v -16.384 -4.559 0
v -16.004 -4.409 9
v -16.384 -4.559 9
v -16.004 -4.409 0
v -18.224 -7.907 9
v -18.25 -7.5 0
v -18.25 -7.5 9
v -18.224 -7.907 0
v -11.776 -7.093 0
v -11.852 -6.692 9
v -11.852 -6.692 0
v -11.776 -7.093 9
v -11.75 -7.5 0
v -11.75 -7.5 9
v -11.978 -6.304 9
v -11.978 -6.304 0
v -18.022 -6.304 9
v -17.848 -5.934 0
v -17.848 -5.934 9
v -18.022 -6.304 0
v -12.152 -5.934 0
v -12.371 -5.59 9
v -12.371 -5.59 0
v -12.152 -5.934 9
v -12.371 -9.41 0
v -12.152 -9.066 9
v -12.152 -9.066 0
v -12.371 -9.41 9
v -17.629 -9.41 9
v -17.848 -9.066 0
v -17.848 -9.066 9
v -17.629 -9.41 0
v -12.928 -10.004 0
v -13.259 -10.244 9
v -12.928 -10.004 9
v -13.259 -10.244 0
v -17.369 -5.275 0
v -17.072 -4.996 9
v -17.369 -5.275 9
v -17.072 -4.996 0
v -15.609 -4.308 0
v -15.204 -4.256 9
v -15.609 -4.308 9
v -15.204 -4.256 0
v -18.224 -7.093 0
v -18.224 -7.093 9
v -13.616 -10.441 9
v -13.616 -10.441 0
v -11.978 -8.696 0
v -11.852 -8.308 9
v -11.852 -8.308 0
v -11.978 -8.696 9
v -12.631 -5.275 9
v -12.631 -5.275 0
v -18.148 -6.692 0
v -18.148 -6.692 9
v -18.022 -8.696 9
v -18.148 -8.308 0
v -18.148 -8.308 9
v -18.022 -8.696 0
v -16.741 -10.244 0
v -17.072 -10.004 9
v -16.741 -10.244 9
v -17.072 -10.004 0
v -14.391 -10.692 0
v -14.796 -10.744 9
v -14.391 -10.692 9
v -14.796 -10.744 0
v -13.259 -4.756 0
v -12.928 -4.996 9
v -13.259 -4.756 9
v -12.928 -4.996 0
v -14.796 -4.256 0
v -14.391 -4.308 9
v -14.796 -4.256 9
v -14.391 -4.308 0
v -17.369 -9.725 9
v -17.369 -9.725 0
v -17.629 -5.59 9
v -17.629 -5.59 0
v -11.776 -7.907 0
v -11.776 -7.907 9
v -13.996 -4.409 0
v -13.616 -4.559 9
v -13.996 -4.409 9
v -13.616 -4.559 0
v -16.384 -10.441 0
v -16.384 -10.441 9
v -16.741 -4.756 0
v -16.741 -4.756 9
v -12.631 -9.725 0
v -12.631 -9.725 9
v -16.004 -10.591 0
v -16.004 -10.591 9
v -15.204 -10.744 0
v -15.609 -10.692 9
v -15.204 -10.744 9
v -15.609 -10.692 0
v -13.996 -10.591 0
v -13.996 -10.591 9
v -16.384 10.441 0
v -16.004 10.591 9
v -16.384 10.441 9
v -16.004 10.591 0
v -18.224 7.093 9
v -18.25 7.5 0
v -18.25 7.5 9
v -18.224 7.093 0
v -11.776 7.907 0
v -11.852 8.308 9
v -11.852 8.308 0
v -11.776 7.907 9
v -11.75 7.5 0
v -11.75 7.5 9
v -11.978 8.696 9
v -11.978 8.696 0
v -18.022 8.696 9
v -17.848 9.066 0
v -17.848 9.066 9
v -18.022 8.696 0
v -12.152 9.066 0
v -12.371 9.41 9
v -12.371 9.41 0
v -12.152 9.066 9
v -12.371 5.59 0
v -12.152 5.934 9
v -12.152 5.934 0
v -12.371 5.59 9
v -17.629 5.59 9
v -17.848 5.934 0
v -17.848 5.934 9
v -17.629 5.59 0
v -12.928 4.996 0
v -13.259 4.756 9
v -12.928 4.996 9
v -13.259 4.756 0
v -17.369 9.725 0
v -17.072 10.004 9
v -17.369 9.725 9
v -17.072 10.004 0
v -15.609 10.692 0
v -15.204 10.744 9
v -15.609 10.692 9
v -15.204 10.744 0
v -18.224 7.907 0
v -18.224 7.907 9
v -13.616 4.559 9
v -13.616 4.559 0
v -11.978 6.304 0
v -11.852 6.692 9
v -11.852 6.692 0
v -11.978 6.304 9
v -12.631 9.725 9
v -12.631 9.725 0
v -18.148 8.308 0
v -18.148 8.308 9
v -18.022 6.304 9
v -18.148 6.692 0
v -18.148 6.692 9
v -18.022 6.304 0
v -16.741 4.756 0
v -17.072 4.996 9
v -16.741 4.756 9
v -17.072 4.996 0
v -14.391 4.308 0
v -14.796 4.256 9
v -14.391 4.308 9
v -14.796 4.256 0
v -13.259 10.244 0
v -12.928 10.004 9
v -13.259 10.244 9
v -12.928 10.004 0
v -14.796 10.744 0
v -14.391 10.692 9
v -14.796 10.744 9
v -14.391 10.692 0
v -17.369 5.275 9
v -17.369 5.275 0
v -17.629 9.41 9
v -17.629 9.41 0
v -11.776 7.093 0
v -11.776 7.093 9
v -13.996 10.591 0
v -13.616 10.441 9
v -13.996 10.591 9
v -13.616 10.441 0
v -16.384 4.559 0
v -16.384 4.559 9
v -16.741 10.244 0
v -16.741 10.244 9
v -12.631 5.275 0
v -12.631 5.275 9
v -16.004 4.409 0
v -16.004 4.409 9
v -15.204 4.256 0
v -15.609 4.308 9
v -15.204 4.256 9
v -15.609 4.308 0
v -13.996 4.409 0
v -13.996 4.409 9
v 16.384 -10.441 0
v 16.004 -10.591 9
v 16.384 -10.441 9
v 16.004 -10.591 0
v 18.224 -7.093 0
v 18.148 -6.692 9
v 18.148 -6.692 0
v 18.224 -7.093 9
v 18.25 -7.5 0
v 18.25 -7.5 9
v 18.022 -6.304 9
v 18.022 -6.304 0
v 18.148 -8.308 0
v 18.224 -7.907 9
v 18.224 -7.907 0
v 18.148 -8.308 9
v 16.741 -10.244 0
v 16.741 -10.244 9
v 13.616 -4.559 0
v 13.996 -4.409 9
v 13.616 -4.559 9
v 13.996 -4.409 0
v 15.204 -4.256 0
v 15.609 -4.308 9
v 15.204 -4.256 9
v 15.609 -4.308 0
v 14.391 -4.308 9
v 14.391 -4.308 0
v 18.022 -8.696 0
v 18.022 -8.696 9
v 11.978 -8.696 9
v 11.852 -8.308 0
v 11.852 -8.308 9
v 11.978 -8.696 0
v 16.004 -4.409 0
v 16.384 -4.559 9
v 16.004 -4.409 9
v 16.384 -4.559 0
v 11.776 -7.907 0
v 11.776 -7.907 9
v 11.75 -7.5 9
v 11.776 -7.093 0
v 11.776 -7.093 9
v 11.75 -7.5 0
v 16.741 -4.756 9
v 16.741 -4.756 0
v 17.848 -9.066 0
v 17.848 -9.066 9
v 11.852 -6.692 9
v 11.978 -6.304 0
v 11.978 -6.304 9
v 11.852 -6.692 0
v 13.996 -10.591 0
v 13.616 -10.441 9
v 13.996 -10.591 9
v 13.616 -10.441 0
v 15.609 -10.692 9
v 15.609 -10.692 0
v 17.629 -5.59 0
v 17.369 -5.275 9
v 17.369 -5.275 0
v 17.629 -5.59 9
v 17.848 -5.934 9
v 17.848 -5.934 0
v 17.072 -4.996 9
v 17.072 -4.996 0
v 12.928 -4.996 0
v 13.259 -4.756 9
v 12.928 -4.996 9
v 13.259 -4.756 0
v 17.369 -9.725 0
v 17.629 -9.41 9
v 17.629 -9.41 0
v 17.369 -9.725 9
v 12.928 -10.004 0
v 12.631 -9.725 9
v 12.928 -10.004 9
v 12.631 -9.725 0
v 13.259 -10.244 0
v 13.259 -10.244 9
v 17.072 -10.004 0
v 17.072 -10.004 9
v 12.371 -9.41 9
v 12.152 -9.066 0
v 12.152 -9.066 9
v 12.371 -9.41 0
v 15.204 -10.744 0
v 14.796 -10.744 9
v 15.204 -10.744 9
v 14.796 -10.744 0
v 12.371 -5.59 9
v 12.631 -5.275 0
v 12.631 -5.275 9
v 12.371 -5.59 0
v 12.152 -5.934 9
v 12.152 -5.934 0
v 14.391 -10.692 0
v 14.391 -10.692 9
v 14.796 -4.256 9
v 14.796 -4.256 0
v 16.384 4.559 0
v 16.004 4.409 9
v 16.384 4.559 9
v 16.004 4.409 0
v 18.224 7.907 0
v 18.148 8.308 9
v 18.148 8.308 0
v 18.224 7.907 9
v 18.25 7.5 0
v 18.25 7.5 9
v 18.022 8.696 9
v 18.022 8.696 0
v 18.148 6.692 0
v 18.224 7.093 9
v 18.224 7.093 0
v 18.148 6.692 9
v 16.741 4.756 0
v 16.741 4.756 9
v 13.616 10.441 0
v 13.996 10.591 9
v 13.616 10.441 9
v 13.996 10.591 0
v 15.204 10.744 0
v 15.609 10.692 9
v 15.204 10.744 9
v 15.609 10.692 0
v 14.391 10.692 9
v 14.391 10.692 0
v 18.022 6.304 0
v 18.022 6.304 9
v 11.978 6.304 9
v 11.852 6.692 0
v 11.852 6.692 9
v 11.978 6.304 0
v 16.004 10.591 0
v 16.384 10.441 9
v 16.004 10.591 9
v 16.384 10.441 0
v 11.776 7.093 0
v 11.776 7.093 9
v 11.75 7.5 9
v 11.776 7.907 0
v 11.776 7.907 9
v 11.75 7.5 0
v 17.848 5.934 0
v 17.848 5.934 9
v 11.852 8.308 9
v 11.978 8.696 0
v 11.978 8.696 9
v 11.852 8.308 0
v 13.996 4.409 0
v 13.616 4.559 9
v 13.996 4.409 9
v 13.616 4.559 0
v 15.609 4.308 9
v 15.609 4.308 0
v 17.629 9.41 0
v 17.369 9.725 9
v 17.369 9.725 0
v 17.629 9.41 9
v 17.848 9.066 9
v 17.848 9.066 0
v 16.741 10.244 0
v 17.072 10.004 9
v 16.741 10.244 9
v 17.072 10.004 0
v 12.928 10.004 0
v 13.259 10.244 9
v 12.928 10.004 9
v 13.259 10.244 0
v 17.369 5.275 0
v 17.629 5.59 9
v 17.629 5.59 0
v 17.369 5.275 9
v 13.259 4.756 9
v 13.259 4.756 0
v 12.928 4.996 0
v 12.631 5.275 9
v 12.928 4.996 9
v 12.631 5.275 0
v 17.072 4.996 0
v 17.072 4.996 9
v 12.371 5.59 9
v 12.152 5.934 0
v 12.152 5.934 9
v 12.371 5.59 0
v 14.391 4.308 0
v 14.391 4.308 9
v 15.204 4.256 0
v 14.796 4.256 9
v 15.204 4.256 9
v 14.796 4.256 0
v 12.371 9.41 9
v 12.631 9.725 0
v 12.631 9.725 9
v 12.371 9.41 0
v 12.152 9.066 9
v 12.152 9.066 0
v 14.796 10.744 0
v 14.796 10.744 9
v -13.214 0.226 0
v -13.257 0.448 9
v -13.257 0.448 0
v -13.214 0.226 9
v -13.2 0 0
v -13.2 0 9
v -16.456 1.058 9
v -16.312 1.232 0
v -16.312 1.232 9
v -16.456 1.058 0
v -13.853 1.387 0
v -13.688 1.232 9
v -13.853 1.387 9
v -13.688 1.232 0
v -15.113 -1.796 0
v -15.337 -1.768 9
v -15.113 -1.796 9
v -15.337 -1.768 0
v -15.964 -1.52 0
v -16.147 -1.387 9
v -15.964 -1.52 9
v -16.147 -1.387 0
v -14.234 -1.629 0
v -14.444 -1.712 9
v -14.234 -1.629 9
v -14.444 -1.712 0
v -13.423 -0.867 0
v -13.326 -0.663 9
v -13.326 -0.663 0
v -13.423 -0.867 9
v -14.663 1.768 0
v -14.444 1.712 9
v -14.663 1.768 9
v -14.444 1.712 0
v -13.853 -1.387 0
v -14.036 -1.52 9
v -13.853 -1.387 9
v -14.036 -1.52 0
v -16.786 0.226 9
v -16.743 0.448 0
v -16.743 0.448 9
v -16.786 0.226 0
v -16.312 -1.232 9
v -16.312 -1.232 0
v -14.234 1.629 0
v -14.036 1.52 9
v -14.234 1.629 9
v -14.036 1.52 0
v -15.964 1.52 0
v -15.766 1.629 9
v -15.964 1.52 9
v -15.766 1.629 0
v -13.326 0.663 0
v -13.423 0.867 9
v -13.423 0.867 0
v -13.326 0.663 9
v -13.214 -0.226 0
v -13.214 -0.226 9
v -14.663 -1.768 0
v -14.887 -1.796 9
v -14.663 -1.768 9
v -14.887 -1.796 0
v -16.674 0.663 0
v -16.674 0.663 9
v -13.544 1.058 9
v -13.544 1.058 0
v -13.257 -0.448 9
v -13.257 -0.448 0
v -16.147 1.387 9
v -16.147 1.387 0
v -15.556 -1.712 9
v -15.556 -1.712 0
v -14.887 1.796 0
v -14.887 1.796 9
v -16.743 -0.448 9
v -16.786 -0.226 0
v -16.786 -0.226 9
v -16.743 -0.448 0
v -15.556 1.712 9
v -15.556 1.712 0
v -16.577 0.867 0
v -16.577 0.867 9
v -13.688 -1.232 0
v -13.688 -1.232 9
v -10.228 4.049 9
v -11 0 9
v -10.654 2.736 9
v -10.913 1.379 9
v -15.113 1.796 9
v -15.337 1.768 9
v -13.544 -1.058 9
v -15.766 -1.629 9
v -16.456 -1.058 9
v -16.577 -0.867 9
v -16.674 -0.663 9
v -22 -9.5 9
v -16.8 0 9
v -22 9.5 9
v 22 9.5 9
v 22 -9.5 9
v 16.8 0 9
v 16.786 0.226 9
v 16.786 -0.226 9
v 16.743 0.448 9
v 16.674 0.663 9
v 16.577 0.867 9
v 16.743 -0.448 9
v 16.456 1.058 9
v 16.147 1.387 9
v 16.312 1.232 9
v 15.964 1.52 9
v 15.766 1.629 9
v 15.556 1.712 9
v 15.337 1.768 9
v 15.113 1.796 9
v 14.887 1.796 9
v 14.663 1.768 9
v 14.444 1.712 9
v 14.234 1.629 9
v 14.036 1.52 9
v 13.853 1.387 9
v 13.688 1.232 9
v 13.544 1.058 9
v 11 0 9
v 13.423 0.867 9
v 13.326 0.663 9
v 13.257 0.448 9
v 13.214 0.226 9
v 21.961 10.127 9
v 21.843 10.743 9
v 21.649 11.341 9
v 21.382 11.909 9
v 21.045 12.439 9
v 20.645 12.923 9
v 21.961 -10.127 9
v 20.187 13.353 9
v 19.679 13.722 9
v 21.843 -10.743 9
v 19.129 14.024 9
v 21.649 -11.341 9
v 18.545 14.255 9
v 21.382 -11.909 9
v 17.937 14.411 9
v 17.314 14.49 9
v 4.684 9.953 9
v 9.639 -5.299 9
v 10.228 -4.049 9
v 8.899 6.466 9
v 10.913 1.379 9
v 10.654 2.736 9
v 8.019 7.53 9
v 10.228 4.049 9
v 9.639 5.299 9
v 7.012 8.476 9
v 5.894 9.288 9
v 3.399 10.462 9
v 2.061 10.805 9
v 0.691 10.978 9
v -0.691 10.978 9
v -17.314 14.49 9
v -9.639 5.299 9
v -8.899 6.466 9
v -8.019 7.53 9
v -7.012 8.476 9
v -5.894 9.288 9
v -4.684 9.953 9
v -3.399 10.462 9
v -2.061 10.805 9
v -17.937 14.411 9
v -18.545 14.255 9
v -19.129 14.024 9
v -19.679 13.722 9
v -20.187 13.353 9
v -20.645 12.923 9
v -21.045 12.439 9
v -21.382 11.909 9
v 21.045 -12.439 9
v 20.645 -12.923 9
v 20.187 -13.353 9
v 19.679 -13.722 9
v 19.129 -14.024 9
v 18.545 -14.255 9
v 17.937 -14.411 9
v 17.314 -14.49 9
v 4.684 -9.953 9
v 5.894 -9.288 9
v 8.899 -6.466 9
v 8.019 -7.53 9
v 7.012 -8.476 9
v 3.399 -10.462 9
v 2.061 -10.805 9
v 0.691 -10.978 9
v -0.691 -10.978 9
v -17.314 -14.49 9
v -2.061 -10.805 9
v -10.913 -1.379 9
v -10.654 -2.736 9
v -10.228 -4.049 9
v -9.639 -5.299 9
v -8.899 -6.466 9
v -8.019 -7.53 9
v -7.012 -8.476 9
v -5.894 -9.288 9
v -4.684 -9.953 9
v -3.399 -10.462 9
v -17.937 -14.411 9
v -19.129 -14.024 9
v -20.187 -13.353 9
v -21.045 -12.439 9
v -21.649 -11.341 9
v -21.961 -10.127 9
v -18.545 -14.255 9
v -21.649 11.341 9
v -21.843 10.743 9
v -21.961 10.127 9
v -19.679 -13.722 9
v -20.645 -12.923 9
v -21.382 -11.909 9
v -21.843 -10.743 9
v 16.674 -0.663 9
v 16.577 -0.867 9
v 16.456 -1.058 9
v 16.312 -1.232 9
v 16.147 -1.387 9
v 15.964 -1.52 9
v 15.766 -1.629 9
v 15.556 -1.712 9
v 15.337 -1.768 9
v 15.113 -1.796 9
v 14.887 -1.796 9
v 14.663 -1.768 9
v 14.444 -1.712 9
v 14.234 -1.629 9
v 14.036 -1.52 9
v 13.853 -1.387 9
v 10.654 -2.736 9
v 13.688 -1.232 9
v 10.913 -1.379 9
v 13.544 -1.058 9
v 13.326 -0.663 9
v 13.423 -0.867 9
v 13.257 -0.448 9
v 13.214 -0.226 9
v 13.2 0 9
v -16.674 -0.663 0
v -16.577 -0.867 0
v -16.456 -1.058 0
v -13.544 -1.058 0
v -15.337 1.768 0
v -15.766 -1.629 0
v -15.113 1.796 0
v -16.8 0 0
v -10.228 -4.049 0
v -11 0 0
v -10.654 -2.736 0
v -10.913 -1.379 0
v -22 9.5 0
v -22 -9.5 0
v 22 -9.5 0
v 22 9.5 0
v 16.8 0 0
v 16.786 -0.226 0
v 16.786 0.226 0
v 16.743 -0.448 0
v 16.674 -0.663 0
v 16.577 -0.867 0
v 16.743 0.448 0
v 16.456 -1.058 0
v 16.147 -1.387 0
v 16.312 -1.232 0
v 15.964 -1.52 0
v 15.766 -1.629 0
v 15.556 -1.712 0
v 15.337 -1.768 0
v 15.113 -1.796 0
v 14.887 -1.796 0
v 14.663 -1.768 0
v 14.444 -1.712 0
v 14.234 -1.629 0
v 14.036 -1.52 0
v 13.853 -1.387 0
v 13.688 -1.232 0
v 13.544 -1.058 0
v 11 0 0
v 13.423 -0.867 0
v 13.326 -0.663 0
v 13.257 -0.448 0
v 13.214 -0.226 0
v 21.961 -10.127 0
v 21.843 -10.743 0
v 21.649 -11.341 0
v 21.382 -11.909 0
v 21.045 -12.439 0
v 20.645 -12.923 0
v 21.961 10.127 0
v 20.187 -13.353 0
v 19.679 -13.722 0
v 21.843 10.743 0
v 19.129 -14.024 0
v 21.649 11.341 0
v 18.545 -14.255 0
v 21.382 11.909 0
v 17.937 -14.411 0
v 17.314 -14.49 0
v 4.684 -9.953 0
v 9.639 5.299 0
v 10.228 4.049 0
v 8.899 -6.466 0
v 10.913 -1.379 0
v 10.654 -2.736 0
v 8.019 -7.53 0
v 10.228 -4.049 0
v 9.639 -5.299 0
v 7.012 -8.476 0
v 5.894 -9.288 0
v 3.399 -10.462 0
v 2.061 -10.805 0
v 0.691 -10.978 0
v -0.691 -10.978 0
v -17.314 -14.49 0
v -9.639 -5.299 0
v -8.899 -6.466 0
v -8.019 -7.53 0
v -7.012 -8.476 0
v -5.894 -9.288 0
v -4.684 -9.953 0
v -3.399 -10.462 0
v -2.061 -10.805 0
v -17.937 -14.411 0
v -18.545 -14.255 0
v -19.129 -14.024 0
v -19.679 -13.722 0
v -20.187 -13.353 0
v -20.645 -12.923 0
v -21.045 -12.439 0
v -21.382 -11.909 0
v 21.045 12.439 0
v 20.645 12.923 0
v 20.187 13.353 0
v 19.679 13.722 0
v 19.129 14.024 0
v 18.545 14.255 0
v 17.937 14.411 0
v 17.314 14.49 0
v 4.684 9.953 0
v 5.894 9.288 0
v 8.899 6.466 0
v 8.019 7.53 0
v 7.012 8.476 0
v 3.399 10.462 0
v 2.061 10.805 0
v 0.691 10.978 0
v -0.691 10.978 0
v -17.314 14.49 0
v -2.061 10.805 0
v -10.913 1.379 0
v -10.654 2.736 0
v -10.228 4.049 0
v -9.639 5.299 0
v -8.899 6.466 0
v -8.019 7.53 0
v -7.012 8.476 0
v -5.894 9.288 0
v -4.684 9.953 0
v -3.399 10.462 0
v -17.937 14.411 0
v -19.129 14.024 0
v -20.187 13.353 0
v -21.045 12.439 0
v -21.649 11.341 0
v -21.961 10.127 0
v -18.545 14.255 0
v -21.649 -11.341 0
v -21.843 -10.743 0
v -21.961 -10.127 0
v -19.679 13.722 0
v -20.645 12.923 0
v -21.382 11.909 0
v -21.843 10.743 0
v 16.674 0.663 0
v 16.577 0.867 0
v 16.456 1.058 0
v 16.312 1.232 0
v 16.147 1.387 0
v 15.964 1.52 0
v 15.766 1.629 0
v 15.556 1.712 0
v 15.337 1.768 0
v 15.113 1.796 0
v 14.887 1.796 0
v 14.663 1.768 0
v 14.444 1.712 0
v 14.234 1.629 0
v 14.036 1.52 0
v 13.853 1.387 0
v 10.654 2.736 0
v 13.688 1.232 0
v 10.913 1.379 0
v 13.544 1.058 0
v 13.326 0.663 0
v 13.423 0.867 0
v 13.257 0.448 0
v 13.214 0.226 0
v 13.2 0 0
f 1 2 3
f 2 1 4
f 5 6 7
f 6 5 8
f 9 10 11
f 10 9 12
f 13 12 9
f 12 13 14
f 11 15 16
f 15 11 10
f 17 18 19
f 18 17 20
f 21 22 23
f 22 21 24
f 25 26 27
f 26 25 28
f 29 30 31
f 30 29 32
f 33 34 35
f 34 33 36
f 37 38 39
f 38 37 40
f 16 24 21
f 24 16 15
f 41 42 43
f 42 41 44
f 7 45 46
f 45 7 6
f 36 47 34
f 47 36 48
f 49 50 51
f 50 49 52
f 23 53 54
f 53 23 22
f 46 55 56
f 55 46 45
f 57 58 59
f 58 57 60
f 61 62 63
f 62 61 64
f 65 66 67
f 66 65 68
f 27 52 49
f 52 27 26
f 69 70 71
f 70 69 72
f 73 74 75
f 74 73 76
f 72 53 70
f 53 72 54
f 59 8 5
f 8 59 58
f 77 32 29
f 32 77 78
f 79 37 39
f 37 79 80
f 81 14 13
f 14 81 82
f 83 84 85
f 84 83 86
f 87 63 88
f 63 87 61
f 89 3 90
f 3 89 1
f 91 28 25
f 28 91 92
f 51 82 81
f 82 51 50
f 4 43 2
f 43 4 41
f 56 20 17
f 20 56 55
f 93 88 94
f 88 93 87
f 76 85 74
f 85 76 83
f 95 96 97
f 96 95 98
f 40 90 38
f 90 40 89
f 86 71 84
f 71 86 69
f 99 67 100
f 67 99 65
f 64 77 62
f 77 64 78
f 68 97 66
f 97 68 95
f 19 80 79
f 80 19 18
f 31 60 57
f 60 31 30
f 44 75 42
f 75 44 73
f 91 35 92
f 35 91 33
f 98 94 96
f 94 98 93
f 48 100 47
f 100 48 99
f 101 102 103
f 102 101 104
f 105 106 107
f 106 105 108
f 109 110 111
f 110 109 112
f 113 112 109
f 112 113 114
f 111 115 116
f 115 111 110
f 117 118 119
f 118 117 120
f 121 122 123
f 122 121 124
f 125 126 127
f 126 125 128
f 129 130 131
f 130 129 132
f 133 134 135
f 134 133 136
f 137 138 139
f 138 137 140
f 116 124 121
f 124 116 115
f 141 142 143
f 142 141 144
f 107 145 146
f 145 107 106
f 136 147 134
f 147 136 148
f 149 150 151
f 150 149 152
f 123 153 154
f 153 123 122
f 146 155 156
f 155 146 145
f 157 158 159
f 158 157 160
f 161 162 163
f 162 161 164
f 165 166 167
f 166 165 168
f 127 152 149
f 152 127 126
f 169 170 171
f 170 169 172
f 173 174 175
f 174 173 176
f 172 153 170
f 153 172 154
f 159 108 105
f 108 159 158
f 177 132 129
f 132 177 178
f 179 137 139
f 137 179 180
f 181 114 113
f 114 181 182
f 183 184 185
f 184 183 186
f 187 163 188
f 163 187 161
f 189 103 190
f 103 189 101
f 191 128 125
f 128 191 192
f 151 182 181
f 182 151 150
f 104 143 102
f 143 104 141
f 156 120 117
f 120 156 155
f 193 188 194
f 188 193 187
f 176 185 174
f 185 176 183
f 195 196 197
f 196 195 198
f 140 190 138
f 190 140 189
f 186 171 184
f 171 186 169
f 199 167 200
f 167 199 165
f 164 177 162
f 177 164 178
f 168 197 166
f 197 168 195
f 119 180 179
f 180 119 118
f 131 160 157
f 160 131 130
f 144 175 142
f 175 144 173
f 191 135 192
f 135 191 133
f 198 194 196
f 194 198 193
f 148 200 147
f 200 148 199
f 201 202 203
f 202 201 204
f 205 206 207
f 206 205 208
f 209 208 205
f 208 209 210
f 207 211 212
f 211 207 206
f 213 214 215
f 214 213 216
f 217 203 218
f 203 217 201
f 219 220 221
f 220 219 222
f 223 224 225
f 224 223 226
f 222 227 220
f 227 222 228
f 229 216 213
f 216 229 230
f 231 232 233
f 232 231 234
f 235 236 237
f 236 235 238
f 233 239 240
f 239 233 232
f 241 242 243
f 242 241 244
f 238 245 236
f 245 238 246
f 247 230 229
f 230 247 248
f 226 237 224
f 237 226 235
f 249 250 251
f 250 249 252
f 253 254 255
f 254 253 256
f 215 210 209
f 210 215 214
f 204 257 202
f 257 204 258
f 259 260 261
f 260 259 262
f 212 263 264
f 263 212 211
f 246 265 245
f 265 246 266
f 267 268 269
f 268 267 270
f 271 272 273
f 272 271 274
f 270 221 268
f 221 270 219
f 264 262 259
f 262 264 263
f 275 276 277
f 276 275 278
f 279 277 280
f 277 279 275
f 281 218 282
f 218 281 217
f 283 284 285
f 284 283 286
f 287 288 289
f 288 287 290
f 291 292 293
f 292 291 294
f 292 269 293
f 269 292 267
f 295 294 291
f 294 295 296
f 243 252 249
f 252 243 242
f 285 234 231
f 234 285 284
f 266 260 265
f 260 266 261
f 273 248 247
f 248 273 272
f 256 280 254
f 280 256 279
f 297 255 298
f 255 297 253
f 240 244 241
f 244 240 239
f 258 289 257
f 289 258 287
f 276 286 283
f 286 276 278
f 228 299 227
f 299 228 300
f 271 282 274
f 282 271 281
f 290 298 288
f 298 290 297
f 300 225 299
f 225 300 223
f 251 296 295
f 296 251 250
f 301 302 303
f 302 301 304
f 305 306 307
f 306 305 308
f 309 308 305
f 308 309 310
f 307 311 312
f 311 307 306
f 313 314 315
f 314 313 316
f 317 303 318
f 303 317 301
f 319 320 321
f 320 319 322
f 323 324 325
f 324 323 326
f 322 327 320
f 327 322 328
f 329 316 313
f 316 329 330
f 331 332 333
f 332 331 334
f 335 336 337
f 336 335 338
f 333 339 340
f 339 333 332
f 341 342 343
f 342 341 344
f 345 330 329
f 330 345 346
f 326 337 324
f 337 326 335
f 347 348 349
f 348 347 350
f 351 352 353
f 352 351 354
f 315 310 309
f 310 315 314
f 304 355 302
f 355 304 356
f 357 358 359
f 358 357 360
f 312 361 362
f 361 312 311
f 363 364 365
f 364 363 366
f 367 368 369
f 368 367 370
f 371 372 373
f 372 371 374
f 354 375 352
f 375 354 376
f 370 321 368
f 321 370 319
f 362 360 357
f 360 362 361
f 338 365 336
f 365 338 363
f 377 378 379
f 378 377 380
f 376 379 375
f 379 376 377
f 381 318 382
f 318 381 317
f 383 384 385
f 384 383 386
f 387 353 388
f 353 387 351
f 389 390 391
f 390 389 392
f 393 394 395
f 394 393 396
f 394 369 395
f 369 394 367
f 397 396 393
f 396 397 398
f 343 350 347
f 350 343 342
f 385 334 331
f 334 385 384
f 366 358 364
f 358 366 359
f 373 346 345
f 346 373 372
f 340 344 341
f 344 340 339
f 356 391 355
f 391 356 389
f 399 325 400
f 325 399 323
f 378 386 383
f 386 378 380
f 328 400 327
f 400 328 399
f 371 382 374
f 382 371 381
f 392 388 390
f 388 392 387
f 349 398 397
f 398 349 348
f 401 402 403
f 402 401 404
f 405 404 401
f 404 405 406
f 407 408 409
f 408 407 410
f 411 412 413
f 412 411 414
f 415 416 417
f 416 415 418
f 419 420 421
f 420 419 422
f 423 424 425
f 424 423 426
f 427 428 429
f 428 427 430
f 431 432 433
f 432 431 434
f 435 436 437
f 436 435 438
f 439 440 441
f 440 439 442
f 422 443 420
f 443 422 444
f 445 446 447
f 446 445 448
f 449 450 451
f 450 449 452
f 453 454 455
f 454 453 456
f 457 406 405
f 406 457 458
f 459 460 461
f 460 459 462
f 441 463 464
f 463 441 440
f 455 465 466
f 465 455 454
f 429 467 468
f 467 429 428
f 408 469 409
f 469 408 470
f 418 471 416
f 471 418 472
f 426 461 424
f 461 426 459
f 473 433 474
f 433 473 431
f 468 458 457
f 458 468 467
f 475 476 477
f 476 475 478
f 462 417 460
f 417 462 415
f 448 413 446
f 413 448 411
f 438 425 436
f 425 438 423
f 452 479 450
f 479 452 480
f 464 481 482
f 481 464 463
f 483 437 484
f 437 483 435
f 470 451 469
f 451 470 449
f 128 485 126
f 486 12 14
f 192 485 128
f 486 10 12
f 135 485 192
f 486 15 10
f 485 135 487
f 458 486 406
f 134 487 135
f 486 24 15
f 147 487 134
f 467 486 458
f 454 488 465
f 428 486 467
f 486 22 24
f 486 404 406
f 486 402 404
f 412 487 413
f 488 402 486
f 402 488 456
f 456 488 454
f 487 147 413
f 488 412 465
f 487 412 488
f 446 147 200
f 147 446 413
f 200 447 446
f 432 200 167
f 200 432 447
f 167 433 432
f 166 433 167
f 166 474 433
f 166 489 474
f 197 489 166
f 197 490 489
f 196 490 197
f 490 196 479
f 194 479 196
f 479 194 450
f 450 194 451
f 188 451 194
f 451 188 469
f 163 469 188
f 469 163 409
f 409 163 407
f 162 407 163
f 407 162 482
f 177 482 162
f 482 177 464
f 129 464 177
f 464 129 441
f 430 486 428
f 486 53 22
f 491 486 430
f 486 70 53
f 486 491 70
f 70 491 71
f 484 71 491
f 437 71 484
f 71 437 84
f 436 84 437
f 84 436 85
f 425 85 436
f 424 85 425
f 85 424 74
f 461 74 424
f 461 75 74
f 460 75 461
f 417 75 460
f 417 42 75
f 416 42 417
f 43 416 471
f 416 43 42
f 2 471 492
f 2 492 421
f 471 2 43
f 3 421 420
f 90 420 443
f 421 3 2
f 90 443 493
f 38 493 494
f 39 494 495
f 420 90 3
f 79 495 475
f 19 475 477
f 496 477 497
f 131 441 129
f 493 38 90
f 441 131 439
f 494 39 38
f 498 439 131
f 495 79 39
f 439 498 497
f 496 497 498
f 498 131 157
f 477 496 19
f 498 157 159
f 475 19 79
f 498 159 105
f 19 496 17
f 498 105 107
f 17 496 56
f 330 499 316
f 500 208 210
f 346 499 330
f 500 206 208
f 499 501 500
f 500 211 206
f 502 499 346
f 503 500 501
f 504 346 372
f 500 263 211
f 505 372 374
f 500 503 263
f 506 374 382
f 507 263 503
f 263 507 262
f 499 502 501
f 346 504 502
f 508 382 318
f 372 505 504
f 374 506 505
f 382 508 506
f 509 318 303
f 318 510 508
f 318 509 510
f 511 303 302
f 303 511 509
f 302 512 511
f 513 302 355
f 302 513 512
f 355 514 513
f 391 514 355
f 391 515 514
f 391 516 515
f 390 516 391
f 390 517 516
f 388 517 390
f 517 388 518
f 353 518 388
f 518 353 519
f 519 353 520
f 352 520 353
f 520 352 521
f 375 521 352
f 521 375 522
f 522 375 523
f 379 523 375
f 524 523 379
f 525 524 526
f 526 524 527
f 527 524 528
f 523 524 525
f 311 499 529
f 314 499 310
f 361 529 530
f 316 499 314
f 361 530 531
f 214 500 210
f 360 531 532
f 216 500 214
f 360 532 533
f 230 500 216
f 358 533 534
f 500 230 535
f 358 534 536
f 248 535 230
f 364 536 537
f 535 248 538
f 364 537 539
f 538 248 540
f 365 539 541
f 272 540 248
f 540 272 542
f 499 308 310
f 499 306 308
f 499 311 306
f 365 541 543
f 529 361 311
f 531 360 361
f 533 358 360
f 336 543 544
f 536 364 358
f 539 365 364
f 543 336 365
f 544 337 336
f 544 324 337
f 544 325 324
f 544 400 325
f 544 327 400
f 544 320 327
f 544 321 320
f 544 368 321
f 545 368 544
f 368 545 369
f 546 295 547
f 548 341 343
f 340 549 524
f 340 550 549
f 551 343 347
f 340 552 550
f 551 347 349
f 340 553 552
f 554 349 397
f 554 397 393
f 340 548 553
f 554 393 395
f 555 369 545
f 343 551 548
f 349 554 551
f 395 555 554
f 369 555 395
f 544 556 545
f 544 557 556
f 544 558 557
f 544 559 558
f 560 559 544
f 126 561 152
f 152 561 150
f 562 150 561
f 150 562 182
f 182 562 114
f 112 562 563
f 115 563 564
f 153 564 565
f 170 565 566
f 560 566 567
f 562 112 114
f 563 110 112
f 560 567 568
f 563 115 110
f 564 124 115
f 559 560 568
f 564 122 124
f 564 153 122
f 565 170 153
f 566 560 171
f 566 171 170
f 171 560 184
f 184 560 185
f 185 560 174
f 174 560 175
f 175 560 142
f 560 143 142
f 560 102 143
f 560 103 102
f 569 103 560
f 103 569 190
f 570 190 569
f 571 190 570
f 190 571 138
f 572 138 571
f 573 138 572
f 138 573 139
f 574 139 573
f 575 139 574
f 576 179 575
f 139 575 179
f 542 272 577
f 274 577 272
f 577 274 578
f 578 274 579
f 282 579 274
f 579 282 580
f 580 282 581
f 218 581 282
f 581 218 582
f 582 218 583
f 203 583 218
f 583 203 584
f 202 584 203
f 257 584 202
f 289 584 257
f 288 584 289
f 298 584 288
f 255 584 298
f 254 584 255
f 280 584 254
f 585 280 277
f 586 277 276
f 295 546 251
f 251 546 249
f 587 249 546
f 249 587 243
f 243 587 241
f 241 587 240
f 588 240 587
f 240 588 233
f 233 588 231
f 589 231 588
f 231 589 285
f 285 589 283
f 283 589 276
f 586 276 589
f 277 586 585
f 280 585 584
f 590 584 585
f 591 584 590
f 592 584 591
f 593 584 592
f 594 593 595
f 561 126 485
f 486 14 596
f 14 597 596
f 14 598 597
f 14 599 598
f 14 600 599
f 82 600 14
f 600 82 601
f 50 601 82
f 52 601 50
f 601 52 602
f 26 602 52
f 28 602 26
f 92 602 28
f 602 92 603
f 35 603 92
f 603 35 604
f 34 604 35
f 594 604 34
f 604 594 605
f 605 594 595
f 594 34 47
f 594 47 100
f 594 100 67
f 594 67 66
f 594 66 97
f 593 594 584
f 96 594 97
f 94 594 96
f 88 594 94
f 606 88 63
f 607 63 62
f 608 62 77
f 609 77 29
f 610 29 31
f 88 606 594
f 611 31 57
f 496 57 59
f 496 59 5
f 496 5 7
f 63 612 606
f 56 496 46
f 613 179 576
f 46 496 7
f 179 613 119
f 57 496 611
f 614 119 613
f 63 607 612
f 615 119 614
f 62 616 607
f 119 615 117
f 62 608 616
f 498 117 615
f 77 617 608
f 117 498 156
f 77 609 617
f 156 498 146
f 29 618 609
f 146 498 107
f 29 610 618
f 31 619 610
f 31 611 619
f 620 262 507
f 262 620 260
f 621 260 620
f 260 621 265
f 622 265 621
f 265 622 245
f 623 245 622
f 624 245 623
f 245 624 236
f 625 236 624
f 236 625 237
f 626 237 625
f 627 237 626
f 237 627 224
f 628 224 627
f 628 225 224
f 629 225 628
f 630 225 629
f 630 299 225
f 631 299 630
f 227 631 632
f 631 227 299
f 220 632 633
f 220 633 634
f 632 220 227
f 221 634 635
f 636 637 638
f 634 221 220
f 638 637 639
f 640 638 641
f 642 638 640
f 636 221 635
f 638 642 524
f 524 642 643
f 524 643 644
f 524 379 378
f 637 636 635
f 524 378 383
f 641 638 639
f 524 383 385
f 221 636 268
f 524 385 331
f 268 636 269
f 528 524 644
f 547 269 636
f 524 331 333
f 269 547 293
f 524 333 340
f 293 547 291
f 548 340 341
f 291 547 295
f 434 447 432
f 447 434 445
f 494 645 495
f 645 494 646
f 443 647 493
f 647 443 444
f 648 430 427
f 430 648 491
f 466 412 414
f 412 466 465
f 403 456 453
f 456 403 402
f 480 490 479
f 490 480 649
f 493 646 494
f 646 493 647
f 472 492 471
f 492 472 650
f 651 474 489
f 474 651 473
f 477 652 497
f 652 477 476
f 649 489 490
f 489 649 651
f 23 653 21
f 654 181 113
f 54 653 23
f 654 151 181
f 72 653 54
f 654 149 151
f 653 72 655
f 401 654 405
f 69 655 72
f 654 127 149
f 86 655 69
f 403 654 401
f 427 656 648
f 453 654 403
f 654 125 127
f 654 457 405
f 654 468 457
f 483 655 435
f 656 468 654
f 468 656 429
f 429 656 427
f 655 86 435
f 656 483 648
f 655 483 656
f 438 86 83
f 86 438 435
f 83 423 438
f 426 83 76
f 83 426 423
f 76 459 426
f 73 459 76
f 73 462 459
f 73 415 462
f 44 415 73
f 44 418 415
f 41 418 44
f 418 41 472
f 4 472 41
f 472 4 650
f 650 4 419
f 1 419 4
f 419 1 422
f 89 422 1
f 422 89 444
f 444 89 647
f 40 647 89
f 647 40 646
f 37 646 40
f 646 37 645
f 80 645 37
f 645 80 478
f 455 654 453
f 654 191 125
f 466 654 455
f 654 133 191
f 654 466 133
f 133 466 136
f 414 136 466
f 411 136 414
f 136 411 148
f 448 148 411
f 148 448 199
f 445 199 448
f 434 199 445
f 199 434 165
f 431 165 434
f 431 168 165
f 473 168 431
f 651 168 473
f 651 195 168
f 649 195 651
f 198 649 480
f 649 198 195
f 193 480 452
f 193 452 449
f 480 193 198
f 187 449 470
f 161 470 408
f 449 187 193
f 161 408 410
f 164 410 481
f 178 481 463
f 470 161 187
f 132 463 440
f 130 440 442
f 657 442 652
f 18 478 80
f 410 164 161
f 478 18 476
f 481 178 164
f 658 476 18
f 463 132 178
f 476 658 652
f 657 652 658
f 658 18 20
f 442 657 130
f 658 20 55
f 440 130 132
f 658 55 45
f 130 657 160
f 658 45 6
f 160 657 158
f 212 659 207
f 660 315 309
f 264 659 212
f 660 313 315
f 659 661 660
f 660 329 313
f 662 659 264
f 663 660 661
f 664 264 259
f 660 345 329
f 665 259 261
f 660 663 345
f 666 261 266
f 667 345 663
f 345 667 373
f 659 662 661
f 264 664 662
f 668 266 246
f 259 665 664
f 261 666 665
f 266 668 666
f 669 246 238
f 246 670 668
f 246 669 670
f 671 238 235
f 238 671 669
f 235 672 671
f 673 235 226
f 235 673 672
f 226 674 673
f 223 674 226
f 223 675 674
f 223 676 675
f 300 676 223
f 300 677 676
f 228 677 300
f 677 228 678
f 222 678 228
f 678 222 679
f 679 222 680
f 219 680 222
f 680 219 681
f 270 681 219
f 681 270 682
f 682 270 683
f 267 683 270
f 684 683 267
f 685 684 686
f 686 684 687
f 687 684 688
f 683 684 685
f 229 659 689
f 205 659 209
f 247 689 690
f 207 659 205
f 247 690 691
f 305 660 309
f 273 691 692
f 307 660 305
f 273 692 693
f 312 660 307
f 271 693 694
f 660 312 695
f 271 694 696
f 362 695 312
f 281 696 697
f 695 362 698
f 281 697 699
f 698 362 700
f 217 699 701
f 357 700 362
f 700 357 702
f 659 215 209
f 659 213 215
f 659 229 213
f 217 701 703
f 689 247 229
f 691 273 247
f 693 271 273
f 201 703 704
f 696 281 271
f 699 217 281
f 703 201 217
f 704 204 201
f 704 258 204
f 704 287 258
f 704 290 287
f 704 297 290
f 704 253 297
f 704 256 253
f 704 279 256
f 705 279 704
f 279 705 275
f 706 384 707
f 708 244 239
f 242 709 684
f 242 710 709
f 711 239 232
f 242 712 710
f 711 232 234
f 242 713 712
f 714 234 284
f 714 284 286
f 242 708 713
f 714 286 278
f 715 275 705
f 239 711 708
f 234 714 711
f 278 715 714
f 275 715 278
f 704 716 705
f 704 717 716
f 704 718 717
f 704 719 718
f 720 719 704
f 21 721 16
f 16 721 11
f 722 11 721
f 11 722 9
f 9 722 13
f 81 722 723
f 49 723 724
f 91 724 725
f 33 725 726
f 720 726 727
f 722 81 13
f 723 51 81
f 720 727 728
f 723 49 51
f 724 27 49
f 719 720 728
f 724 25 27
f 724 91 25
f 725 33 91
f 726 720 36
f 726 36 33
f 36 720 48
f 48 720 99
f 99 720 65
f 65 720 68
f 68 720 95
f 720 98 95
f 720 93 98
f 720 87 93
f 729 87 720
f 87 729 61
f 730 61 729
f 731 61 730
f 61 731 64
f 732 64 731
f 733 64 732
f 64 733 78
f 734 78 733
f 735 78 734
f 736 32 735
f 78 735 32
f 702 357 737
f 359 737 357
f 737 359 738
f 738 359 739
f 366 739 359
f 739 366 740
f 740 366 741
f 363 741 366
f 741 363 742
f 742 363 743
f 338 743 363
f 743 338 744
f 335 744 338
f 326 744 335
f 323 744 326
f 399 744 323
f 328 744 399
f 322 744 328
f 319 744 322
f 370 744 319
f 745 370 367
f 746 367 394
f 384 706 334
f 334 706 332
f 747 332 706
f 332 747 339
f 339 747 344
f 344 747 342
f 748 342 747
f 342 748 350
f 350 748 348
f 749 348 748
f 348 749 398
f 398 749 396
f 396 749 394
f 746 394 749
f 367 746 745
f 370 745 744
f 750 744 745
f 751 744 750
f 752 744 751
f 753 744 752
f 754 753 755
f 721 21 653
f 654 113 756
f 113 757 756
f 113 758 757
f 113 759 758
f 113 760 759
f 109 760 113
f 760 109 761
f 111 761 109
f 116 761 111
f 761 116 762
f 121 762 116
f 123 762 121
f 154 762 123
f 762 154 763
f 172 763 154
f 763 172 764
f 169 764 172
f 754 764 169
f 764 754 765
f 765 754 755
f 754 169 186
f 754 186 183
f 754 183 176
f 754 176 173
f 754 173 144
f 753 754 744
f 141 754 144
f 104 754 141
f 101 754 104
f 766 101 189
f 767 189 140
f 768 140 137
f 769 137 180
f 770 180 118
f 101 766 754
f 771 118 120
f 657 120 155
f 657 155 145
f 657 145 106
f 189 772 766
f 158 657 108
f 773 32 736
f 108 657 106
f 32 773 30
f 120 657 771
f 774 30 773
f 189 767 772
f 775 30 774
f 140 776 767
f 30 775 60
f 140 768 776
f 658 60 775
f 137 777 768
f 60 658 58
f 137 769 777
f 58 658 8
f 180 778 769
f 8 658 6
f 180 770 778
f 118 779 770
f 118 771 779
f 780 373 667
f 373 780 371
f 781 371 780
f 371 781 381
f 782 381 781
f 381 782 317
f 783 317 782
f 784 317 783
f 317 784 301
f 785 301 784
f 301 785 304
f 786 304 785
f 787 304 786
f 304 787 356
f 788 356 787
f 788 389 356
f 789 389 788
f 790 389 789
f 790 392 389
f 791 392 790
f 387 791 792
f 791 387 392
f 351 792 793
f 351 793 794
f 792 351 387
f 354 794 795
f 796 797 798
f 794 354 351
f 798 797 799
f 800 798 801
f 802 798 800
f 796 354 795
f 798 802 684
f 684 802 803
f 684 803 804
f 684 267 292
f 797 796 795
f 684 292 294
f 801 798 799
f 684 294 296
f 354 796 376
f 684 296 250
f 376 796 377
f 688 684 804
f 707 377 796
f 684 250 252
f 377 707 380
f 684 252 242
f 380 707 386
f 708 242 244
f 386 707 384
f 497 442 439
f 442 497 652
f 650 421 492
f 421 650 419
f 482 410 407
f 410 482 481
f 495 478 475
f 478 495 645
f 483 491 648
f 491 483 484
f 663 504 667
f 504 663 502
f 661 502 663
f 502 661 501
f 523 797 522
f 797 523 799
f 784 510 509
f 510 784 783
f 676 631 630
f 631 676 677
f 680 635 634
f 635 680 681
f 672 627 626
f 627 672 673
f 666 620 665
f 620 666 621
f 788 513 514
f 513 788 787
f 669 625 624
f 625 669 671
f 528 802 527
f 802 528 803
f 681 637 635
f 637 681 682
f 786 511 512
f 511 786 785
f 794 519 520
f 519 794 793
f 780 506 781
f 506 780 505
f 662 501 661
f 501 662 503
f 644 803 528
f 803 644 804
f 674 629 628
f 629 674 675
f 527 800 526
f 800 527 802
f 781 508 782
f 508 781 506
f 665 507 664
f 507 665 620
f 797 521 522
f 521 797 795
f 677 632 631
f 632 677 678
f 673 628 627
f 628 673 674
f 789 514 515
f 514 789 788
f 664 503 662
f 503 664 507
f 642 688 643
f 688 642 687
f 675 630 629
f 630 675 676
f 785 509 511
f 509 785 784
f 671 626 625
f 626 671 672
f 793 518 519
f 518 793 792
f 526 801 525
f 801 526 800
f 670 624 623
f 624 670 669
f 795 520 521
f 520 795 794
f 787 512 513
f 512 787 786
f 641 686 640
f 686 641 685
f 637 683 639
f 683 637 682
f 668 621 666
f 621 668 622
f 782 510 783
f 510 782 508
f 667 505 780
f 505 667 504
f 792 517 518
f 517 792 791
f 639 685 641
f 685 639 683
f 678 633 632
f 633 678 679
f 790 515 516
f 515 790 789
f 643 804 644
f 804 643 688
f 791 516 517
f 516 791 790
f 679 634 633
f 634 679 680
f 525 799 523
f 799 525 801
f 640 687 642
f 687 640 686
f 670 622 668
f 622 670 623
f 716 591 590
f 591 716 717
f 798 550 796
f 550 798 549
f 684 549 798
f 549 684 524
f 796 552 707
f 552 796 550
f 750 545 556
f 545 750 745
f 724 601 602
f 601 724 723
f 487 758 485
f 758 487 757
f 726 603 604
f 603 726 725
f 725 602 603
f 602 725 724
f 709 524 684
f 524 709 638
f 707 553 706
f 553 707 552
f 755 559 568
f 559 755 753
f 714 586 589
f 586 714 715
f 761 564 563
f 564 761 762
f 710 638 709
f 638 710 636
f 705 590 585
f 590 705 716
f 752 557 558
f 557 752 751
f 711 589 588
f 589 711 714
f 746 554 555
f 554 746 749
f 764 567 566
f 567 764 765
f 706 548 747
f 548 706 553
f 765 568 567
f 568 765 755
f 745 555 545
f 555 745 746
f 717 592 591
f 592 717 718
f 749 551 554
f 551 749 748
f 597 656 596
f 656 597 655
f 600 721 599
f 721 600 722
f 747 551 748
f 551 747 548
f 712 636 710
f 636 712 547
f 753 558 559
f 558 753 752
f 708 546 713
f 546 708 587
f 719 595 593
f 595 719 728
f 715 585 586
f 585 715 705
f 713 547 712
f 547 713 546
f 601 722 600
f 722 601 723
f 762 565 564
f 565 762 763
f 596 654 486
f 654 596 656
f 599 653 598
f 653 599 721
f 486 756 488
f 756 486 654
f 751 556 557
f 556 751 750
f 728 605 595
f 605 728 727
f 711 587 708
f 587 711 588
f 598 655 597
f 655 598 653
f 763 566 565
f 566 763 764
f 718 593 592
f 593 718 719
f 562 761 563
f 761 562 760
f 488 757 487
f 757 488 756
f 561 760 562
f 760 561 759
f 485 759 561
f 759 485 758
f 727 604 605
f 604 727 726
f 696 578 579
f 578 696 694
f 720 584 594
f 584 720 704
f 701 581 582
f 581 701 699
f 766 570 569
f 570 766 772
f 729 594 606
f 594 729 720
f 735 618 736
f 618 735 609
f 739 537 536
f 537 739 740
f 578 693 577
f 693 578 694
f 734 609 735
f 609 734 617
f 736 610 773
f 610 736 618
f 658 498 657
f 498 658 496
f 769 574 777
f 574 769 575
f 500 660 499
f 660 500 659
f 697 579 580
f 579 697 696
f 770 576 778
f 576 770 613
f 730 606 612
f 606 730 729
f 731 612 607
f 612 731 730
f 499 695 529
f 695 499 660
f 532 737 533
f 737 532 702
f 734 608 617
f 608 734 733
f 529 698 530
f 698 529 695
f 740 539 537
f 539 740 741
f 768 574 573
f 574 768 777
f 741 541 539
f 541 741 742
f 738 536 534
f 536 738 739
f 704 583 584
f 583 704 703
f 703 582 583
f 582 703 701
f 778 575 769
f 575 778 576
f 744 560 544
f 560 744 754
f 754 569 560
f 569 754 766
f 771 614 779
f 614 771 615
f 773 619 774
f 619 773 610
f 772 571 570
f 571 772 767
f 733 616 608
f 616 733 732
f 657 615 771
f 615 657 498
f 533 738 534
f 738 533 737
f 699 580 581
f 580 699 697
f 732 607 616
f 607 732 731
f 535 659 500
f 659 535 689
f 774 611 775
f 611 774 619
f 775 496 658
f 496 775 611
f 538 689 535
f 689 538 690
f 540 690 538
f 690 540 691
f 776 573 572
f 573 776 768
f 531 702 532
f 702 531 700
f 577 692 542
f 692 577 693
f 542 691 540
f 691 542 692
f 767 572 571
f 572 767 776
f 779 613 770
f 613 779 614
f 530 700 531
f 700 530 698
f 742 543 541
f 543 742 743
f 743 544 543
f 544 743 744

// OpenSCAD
$fn = 50;


difference() {
	union() {
		hull() {
			translate(v = [-17.0000000000, 9.5000000000, 0]) {
				cylinder(h = 9, r = 5);
			}
			translate(v = [17.0000000000, 9.5000000000, 0]) {
				cylinder(h = 9, r = 5);
			}
			translate(v = [-17.0000000000, -9.5000000000, 0]) {
				cylinder(h = 9, r = 5);
			}
			translate(v = [17.0000000000, -9.5000000000, 0]) {
				cylinder(h = 9, r = 5);
			}
		}
	}
	union() {
		#translate(v = [-15.0000000000, -7.5000000000, 0]) {
			cylinder(h = 9, r = 3.2500000000);
		}
		#translate(v = [-15.0000000000, 7.5000000000, 0]) {
			cylinder(h = 9, r = 3.2500000000);
		}
		#translate(v = [15.0000000000, -7.5000000000, 0]) {
			cylinder(h = 9, r = 3.2500000000);
		}
		#translate(v = [15.0000000000, 7.5000000000, 0]) {
			cylinder(h = 9, r = 3.2500000000);
		}
		#translate(v = [-15.0000000000, -7.5000000000, -100.0000000000]) {
			cylinder(h = 200, r = 3.2500000000);
		}
		#translate(v = [-15.0000000000, 7.5000000000, -100.0000000000]) {
			cylinder(h = 200, r = 3.2500000000);
		}
		#translate(v = [15.0000000000, -7.5000000000, -100.0000000000]) {
			cylinder(h = 200, r = 3.2500000000);
		}
		#translate(v = [15.0000000000, 7.5000000000, -100.0000000000]) {
			cylinder(h = 200, r = 3.2500000000);
		}
		#translate(v = [-15.0000000000, -7.5000000000, 0]) {
			cylinder(h = 9, r = 1.8000000000);
		}
		#translate(v = [-15.0000000000, 0.0000000000, 0]) {
			cylinder(h = 9, r = 1.8000000000);
		}
		#translate(v = [-15.0000000000, 7.5000000000, 0]) {
			cylinder(h = 9, r = 1.8000000000);
		}
		#translate(v = [15.0000000000, -7.5000000000, 0]) {
			cylinder(h = 9, r = 1.8000000000);
		}
		#translate(v = [15.0000000000, 0.0000000000, 0]) {
			cylinder(h = 9, r = 1.8000000000);
		}
		#translate(v = [15.0000000000, 7.5000000000, 0]) {
			cylinder(h = 9, r = 1.8000000000);
		}
		#translate(v = [-15.0000000000, -7.5000000000, 0]) {
			cylinder(h = 9, r = 1.8000000000);
		}
		#translate(v = [-15.0000000000, 0.0000000000, 0]) {
			cylinder(h = 9, r = 1.8000000000);
		}
		#translate(v = [-15.0000000000, 7.5000000000, 0]) {
			cylinder(h = 9, r = 1.8000000000);
		}
		#translate(v = [15.0000000000, -7.5000000000, 0]) {
			cylinder(h = 9, r = 1.8000000000);
		}
		#translate(v = [15.0000000000, 0.0000000000, 0]) {
			cylinder(h = 9, r = 1.8000000000);
		}
		#translate(v = [15.0000000000, 7.5000000000, 0]) {
			cylinder(h = 9, r = 1.8000000000);
		}
		#translate(v = [-15.0000000000, -7.5000000000, 0]) {
			cylinder(h = 9, r = 1.8000000000);
		}
		#translate(v = [-15.0000000000, 0.0000000000, 0]) {
			cylinder(h = 9, r = 1.8000000000);
		}
		#translate(v = [-15.0000000000, 7.5000000000, 0]) {
			cylinder(h = 9, r = 1.8000000000);
		}
		#translate(v = [15.0000000000, -7.5000000000, 0]) {
			cylinder(h = 9, r = 1.8000000000);
		}
		#translate(v = [15.0000000000, 0.0000000000, 0]) {
			cylinder(h = 9, r = 1.8000000000);
		}
		#translate(v = [15.0000000000, 7.5000000000, 0]) {
			cylinder(h = 9, r = 1.8000000000);
		}
		#cylinder(h = 9, r = 11.0000000000);
	}
}
